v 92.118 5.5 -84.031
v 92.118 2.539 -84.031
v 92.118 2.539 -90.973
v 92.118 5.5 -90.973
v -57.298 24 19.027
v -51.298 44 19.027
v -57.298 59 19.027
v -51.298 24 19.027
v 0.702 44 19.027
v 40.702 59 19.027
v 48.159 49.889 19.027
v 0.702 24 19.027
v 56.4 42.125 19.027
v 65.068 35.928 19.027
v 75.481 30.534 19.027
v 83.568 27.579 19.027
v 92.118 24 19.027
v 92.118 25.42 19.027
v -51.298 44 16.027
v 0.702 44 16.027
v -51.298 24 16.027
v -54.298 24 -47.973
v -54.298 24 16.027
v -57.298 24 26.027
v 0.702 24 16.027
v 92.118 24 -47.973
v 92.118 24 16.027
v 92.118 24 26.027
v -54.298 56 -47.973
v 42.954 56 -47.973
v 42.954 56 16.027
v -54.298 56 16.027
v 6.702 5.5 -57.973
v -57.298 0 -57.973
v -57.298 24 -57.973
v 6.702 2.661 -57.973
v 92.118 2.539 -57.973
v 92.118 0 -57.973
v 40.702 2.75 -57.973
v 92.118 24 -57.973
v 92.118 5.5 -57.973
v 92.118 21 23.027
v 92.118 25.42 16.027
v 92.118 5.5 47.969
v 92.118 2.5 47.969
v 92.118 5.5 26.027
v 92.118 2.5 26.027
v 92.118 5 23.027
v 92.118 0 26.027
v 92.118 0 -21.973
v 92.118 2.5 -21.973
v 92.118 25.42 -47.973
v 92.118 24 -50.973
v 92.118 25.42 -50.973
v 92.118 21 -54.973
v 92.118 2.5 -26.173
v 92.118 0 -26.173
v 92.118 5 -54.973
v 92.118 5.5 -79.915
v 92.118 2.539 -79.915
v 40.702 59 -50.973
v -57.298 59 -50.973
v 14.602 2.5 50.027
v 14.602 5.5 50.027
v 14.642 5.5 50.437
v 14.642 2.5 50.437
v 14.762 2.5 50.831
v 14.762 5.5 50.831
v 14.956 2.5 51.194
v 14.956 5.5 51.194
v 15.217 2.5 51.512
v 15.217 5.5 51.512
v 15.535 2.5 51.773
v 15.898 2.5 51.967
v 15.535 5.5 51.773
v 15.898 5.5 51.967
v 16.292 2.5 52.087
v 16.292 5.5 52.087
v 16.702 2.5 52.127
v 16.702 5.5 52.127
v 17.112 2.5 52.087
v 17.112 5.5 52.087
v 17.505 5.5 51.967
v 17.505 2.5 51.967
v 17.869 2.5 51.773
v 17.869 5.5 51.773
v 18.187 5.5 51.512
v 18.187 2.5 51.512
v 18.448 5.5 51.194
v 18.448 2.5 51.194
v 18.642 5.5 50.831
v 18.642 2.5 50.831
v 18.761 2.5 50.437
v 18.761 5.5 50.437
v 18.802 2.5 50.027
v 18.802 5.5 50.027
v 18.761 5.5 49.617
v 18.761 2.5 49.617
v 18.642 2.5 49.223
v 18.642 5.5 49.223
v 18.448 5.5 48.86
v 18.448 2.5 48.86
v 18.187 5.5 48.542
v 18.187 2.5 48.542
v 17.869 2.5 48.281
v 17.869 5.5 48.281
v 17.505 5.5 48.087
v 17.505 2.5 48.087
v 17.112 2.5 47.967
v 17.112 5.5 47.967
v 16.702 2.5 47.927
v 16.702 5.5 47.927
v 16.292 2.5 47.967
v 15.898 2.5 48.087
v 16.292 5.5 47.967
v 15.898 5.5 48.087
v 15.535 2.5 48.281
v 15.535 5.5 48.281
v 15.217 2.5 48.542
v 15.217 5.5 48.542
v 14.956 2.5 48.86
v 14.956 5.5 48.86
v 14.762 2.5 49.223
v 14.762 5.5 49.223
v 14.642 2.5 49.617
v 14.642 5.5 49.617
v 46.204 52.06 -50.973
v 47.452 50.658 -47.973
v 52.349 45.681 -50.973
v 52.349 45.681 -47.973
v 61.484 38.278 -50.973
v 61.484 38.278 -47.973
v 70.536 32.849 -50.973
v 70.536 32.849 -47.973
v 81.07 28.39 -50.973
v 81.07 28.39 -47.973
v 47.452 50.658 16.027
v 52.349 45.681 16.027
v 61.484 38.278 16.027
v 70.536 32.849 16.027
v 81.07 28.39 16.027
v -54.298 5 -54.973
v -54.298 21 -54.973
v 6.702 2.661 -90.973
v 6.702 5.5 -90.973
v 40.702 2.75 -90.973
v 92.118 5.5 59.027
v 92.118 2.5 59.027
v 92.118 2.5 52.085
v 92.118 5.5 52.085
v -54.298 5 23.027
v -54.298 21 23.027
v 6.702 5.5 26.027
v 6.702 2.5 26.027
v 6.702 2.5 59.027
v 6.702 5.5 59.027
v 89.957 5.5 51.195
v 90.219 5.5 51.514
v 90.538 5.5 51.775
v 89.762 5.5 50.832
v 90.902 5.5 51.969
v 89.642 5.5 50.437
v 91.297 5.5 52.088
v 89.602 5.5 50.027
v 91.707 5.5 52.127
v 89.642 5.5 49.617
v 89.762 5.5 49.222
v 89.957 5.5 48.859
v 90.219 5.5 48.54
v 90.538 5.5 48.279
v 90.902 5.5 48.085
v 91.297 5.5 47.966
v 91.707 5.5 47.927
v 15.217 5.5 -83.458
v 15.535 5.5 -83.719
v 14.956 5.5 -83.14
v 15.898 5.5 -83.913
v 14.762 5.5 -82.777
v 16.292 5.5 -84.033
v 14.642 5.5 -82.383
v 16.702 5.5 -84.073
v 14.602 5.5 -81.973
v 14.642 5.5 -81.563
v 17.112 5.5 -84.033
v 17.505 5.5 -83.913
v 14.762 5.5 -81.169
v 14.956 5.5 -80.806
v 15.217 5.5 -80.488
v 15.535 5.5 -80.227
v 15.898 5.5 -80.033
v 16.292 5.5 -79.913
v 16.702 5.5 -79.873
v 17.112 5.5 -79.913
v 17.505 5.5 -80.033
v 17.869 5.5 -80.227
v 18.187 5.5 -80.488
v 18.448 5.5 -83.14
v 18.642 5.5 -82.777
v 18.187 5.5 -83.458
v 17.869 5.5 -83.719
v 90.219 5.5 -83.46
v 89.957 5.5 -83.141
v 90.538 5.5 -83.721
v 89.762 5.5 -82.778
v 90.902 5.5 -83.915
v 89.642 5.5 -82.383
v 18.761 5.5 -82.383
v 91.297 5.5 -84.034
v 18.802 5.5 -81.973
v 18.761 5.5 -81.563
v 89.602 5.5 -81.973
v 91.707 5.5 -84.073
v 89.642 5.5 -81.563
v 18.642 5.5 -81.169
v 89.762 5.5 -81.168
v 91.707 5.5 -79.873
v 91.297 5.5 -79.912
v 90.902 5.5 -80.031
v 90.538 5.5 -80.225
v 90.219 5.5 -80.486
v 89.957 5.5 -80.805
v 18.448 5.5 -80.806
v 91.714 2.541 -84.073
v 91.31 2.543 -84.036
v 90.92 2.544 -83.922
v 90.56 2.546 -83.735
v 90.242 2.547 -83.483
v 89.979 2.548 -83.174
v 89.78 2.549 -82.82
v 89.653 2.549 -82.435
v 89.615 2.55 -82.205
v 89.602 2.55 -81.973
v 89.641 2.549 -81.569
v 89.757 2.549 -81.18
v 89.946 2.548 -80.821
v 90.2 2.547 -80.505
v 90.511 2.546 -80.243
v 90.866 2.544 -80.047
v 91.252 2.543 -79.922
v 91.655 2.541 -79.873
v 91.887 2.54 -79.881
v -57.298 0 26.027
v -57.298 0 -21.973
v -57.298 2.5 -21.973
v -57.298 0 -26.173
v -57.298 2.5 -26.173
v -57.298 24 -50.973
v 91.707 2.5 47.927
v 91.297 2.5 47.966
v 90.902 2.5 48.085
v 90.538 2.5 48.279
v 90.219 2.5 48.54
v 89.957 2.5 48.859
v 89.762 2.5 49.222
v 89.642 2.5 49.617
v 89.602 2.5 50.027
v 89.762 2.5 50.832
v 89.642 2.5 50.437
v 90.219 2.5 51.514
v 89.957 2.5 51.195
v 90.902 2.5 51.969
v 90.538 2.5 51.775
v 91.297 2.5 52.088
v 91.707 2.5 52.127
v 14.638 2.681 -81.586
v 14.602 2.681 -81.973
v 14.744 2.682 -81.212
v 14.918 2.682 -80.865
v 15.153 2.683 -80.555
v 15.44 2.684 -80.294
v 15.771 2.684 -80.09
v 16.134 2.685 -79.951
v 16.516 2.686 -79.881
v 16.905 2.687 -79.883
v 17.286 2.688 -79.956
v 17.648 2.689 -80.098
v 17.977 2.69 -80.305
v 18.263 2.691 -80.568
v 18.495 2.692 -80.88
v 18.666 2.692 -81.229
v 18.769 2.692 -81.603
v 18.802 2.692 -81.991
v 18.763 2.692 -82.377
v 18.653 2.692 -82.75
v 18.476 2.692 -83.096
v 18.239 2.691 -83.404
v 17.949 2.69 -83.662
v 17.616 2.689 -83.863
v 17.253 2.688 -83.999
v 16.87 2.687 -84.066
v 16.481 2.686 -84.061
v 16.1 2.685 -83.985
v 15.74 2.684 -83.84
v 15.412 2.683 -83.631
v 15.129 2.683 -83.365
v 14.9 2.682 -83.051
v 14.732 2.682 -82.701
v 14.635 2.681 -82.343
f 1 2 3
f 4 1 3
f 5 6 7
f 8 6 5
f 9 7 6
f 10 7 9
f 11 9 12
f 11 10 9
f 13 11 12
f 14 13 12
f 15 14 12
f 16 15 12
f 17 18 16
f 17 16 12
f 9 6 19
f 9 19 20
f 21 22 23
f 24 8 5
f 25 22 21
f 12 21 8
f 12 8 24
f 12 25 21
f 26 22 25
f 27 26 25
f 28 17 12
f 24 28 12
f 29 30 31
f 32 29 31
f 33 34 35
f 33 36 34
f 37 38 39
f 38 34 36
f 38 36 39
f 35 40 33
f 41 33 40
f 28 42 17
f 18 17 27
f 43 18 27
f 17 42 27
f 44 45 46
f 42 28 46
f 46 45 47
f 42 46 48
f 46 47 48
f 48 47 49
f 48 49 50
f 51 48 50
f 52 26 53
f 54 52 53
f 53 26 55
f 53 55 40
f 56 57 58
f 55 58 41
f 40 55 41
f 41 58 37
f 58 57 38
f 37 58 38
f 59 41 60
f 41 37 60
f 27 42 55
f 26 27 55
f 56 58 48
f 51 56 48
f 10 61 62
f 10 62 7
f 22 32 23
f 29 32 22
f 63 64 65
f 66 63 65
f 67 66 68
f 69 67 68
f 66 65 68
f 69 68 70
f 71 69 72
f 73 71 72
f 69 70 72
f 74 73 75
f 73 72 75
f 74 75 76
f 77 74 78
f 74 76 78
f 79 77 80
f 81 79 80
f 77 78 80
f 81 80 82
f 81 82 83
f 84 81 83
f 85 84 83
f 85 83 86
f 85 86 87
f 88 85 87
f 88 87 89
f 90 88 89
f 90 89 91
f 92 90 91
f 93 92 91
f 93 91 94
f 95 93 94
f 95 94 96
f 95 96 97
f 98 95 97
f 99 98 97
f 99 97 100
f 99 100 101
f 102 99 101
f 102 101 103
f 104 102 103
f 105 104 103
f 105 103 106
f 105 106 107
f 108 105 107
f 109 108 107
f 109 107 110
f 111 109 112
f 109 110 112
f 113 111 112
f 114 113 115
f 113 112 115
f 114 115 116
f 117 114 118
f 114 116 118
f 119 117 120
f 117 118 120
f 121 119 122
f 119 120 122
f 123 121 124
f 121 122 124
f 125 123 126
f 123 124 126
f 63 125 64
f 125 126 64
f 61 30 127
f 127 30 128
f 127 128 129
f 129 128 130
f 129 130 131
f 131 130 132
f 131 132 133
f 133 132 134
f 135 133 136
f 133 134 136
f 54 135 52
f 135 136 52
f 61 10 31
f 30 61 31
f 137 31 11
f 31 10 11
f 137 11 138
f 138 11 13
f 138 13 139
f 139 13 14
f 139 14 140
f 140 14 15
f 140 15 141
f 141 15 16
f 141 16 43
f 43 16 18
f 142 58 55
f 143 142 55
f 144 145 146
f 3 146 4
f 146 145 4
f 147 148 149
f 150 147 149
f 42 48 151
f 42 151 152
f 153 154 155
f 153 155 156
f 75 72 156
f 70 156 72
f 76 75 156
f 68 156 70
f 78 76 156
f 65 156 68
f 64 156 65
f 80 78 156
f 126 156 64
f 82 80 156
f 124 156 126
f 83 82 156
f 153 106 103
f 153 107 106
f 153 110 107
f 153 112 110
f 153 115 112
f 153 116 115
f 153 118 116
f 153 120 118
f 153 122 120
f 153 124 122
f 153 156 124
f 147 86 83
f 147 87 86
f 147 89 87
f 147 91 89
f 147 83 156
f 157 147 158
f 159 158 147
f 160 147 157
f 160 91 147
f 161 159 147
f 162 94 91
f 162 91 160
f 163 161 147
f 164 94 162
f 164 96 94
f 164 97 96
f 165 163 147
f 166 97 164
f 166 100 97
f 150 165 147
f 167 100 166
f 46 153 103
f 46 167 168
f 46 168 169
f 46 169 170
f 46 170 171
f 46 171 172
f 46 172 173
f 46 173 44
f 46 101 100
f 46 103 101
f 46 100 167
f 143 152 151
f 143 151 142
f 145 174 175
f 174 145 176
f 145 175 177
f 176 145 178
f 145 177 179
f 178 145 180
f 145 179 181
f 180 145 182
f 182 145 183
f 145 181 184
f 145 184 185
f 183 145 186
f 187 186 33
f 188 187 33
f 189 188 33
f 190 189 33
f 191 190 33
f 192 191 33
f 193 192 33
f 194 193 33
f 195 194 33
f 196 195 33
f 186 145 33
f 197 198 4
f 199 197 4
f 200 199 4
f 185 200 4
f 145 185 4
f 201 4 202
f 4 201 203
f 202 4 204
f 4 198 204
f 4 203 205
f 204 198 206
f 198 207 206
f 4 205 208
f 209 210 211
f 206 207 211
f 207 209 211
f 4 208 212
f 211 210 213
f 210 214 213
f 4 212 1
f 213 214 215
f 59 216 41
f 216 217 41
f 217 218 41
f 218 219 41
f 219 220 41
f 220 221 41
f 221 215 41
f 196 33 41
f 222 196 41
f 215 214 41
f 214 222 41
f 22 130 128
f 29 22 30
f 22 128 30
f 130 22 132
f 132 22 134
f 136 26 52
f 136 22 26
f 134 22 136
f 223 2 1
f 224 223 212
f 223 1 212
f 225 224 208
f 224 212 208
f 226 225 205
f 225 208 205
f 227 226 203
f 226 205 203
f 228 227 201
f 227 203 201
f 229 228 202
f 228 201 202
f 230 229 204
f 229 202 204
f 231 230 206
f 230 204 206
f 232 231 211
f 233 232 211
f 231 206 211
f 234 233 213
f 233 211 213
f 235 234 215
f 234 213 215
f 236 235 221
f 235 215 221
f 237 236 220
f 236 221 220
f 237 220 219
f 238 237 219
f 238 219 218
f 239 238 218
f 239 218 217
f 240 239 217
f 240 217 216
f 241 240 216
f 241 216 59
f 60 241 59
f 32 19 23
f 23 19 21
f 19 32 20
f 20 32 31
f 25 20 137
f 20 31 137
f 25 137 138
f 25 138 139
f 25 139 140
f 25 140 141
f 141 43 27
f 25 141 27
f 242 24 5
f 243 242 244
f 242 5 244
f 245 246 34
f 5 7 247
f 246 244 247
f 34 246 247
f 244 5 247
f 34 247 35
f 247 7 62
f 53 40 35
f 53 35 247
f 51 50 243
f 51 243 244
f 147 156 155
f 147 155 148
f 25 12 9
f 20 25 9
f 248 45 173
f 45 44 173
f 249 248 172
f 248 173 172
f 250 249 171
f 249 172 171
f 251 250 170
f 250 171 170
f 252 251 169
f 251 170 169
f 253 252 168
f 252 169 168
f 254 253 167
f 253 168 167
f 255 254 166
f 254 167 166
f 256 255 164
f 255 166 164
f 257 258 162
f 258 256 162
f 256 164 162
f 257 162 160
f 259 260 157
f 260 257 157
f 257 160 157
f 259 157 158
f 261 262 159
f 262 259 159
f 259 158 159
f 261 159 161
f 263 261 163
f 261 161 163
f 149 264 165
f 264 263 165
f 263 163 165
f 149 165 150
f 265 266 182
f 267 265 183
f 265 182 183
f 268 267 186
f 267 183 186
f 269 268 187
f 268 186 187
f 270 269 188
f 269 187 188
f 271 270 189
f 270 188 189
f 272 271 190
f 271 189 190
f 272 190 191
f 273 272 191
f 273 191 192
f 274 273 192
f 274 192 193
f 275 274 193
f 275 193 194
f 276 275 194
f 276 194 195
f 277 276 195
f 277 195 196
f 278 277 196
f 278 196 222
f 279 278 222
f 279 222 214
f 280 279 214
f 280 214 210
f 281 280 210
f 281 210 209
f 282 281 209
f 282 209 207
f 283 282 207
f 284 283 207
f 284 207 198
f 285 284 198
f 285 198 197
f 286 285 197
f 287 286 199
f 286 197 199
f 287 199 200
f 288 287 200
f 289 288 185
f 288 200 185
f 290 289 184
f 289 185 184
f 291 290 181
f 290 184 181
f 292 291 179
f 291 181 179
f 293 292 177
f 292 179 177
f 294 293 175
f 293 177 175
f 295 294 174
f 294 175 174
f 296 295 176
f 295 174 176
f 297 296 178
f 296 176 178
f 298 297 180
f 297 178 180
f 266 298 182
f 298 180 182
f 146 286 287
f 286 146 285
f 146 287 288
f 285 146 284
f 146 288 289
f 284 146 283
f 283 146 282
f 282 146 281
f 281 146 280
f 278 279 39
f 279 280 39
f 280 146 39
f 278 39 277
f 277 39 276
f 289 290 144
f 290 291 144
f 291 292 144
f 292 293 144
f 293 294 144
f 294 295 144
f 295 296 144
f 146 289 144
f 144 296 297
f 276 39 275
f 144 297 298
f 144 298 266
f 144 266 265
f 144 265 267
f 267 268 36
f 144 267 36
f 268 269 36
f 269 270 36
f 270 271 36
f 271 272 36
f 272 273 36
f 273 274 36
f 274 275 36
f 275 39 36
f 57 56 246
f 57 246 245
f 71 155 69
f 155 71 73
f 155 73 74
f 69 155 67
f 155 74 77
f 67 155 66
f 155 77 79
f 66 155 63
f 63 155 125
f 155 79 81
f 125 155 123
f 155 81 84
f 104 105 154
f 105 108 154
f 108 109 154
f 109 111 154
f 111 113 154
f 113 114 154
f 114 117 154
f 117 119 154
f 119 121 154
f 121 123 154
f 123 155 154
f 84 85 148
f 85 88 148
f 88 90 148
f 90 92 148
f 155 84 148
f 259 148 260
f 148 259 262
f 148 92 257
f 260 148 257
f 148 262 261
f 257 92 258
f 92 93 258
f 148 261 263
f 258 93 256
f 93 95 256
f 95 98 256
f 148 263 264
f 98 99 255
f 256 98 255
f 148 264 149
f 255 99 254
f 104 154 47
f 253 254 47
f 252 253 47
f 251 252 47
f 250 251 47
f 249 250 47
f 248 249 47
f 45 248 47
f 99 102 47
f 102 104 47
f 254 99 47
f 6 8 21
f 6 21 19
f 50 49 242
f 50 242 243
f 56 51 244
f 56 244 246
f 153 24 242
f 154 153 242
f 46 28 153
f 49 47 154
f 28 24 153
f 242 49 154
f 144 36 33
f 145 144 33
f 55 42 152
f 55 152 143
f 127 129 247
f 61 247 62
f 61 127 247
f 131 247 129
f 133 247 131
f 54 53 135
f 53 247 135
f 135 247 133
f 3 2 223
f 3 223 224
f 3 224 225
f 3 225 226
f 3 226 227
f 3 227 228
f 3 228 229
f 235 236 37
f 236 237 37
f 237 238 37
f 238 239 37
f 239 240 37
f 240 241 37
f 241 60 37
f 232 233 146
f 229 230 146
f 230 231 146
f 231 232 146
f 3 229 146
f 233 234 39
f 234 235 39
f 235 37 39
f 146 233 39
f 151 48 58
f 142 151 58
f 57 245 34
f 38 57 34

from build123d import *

# Parameters (mm, degrees)
ESQUISSE1_W                  = 156
ESQUISSE1_H                  = 84
BOSS_EXTRU_1_DEPTH           = 59
ESQUISSE2_W                  = 78
ESQUISSE2_H                  = 16
ESQUISSE2_W_2                = 7
ESQUISSE2_H_2                = 35
ESQUISSE2_W_3                = 4.2
ESQUISSE2_H_3                = 2.5
ENL_V_MAT_EXTRU_1_DEPTH      = 177.572550515
ENL_V_MAT_EXTRU_3_DEPTH      = 141.546285889
ESQUISSE4_W                  = 52
ESQUISSE4_H                  = 20
ENL_V_MAT_EXTRU_4_DEPTH      = 59
BOSS_EXTRU_2_DEPTH           = 34
ESQUISSE6_W                  = 95
ESQUISSE6_H                  = 3
BOSS_EXTRU_3_DEPTH           = 34
ESQUISSE8_R                  = 2.1
ENL_V_MAT_EXTRU_5_DEPTH      = 37
BOSS_EXTRU_4_DEPTH           = 3
ENL_V_MAT_EXTRU_6_DEPTH      = 30
ENL_V_MAT_EXTRU_6_DEPTH_BACK = 10
ESQUISSE10_W                 = 9.584266769
ESQUISSE10_H                 = 152
ESQUISSE11_W                 = 85.415733231
ESQUISSE11_H                 = 1
ENL_V_MAT_EXTRU_7_DEPTH      = 10


with BuildPart() as part:
    # Esquisse1 → Boss.-Extru.1 (new body)
    with BuildSketch(Plane(origin=(0, 0, 0), x_dir=(1, 0, 0), z_dir=(0, 1, 0))):
        with Locations((23.701811573, 15.972972973)):
            Rectangle(ESQUISSE1_W, ESQUISSE1_H)
    extrude(amount=BOSS_EXTRU_1_DEPTH)

    # Esquisse2 → Enlèv. mat.-Extru.1 (cut, through all)
    with BuildSketch(Plane(origin=(101.701811573, 0, 0), x_dir=(0, 0, -1), z_dir=(1, 0, 0))):
        Polygon((15.972972973, 24), (47.972972973, 24), (47.972972973, 56), (-16.027027027, 56), (-16.027027027, 24), align=None)
        with Locations((15.972972973, 13)):
            Rectangle(ESQUISSE2_W, ESQUISSE2_H)
        with Locations((-22.527027027, 41.5)):
            Rectangle(ESQUISSE2_W_2, ESQUISSE2_H_2)
        Polygon((54.972972973, 24), (57.972972973, 24), (57.972972973, 59), (50.972972973, 59), (50.972972973, 24), align=None)
        with Locations((24.072972973, 1.25)):
            Rectangle(ESQUISSE2_W_3, ESQUISSE2_H_3)
    extrude(amount=-ENL_V_MAT_EXTRU_1_DEPTH, mode=Mode.SUBTRACT)

    # Esquisse3 → Enlèv. mat.-Extru.3 (cut, through all)
    with BuildSketch(Plane.XY.offset(19.027027027)):
        with BuildLine():
            Line((101.701811573, 59), (40.701811573, 59))
            add(Edge.make_bspline(
                [(40.701811573, 59), (63.23269898, 27.796698054), (101.701811573, 24)],
                knots=[0, 0, 0, 1, 1, 1], degree=2))
            Line((101.701811573, 24), (101.701811573, 59))
        make_face()
    extrude(amount=-ENL_V_MAT_EXTRU_3_DEPTH, mode=Mode.SUBTRACT)

    # Esquisse4 → Enlèv. mat.-Extru.4 (cut)
    with BuildSketch(Plane.XY.offset(19.027027027)):
        with Locations((-25.298188427, 34)):
            Rectangle(ESQUISSE4_W, ESQUISSE4_H)
    extrude(amount=-ENL_V_MAT_EXTRU_4_DEPTH, mode=Mode.SUBTRACT)

    # Esquisse5 → Boss.-Extru.2 (add)
    with BuildSketch(Plane(origin=(0, 0, -57.972972973), x_dir=(-1, 0, 0), z_dir=(0, 0, -1))):
        Polygon((-101.701811573, 2.5), (-40.701811573, 2.75), (-40.701811573, 5.5), (-101.701811573, 5.5), align=None)
        Polygon((-40.701811573, 2.75), (-6.701811573, 2.660526316), (-6.701811573, 5.5), (-40.701811573, 5.5), align=None)
    extrude(amount=BOSS_EXTRU_2_DEPTH)

    # Esquisse6 → Boss.-Extru.3 (add)
    with BuildSketch(Plane.XY.offset(26.027027027)):
        with Locations((54.201811573, 4)):
            Rectangle(ESQUISSE6_W, ESQUISSE6_H)
    extrude(amount=BOSS_EXTRU_3_DEPTH)

    # Esquisse8 → Enlèv. mat.-Extru.5 (cut)
    with BuildSketch(Plane(origin=(0, 5.5, 0), x_dir=(1, 0, 0), z_dir=(0, 1, 0))):
        with Locations(Location((16.701811573, -50.027027027, 0), (0, 0, 180))):
            Circle(ESQUISSE8_R)
        with Locations(Location((91.701811573, -50.027027027, 0), (0, 0, 180))):
            Circle(ESQUISSE8_R)
        with Locations(Location((16.701811573, 81.972972973, 0), (0, 0, 180))):
            Circle(ESQUISSE8_R)
        with Locations(Location((91.701811573, 81.972972973, 0), (0, 0, 180))):
            Circle(ESQUISSE8_R)
    extrude(amount=-ENL_V_MAT_EXTRU_5_DEPTH, mode=Mode.SUBTRACT)

    # Esquisse9 → Boss.-Extru.4 (add)
    with BuildSketch(Plane.ZY.offset(54.298188427)):
        Polygon((-57.972972973, 0), (-57.972972973, 24), (-50.972972973, 24), (-50.972972973, 59), (19.027027027, 59), (19.027027027, 24), (26.027027027, 24), (26.027027027, 0), (-21.972972973, 0), (-21.972972973, 2.5), (-26.172972973, 2.5), (-26.172972973, 0), align=None)
    extrude(amount=BOSS_EXTRU_4_DEPTH)

    # Esquisse10 → Enlèv. mat.-Extru.6 (cut, two sides: drawn at the far end of the back side and taken through both)
    with BuildSketch(Plane(origin=(0, 5.5, 0), x_dir=(1, 0, 0), z_dir=(0, 1, 0)).offset(-ENL_V_MAT_EXTRU_6_DEPTH_BACK)):
        with Locations((96.909678189, 15.972972973)):
            Rectangle(ESQUISSE10_W, ESQUISSE10_H)
    extrude(amount=ENL_V_MAT_EXTRU_6_DEPTH + ENL_V_MAT_EXTRU_6_DEPTH_BACK, mode=Mode.SUBTRACT)

    # Esquisse11 → Enlèv. mat.-Extru.7 (cut)
    with BuildSketch(Plane(origin=(0, 5.5, 0), x_dir=(1, 0, 0), z_dir=(0, 1, 0))):
        with Locations((49.409678189, 91.472972973)):
            Rectangle(ESQUISSE11_W, ESQUISSE11_H)
        with Locations((49.409678189, -59.527027027)):
            Rectangle(ESQUISSE11_W, ESQUISSE11_H)
    extrude(amount=-ENL_V_MAT_EXTRU_7_DEPTH, mode=Mode.SUBTRACT)


solid = part.part
